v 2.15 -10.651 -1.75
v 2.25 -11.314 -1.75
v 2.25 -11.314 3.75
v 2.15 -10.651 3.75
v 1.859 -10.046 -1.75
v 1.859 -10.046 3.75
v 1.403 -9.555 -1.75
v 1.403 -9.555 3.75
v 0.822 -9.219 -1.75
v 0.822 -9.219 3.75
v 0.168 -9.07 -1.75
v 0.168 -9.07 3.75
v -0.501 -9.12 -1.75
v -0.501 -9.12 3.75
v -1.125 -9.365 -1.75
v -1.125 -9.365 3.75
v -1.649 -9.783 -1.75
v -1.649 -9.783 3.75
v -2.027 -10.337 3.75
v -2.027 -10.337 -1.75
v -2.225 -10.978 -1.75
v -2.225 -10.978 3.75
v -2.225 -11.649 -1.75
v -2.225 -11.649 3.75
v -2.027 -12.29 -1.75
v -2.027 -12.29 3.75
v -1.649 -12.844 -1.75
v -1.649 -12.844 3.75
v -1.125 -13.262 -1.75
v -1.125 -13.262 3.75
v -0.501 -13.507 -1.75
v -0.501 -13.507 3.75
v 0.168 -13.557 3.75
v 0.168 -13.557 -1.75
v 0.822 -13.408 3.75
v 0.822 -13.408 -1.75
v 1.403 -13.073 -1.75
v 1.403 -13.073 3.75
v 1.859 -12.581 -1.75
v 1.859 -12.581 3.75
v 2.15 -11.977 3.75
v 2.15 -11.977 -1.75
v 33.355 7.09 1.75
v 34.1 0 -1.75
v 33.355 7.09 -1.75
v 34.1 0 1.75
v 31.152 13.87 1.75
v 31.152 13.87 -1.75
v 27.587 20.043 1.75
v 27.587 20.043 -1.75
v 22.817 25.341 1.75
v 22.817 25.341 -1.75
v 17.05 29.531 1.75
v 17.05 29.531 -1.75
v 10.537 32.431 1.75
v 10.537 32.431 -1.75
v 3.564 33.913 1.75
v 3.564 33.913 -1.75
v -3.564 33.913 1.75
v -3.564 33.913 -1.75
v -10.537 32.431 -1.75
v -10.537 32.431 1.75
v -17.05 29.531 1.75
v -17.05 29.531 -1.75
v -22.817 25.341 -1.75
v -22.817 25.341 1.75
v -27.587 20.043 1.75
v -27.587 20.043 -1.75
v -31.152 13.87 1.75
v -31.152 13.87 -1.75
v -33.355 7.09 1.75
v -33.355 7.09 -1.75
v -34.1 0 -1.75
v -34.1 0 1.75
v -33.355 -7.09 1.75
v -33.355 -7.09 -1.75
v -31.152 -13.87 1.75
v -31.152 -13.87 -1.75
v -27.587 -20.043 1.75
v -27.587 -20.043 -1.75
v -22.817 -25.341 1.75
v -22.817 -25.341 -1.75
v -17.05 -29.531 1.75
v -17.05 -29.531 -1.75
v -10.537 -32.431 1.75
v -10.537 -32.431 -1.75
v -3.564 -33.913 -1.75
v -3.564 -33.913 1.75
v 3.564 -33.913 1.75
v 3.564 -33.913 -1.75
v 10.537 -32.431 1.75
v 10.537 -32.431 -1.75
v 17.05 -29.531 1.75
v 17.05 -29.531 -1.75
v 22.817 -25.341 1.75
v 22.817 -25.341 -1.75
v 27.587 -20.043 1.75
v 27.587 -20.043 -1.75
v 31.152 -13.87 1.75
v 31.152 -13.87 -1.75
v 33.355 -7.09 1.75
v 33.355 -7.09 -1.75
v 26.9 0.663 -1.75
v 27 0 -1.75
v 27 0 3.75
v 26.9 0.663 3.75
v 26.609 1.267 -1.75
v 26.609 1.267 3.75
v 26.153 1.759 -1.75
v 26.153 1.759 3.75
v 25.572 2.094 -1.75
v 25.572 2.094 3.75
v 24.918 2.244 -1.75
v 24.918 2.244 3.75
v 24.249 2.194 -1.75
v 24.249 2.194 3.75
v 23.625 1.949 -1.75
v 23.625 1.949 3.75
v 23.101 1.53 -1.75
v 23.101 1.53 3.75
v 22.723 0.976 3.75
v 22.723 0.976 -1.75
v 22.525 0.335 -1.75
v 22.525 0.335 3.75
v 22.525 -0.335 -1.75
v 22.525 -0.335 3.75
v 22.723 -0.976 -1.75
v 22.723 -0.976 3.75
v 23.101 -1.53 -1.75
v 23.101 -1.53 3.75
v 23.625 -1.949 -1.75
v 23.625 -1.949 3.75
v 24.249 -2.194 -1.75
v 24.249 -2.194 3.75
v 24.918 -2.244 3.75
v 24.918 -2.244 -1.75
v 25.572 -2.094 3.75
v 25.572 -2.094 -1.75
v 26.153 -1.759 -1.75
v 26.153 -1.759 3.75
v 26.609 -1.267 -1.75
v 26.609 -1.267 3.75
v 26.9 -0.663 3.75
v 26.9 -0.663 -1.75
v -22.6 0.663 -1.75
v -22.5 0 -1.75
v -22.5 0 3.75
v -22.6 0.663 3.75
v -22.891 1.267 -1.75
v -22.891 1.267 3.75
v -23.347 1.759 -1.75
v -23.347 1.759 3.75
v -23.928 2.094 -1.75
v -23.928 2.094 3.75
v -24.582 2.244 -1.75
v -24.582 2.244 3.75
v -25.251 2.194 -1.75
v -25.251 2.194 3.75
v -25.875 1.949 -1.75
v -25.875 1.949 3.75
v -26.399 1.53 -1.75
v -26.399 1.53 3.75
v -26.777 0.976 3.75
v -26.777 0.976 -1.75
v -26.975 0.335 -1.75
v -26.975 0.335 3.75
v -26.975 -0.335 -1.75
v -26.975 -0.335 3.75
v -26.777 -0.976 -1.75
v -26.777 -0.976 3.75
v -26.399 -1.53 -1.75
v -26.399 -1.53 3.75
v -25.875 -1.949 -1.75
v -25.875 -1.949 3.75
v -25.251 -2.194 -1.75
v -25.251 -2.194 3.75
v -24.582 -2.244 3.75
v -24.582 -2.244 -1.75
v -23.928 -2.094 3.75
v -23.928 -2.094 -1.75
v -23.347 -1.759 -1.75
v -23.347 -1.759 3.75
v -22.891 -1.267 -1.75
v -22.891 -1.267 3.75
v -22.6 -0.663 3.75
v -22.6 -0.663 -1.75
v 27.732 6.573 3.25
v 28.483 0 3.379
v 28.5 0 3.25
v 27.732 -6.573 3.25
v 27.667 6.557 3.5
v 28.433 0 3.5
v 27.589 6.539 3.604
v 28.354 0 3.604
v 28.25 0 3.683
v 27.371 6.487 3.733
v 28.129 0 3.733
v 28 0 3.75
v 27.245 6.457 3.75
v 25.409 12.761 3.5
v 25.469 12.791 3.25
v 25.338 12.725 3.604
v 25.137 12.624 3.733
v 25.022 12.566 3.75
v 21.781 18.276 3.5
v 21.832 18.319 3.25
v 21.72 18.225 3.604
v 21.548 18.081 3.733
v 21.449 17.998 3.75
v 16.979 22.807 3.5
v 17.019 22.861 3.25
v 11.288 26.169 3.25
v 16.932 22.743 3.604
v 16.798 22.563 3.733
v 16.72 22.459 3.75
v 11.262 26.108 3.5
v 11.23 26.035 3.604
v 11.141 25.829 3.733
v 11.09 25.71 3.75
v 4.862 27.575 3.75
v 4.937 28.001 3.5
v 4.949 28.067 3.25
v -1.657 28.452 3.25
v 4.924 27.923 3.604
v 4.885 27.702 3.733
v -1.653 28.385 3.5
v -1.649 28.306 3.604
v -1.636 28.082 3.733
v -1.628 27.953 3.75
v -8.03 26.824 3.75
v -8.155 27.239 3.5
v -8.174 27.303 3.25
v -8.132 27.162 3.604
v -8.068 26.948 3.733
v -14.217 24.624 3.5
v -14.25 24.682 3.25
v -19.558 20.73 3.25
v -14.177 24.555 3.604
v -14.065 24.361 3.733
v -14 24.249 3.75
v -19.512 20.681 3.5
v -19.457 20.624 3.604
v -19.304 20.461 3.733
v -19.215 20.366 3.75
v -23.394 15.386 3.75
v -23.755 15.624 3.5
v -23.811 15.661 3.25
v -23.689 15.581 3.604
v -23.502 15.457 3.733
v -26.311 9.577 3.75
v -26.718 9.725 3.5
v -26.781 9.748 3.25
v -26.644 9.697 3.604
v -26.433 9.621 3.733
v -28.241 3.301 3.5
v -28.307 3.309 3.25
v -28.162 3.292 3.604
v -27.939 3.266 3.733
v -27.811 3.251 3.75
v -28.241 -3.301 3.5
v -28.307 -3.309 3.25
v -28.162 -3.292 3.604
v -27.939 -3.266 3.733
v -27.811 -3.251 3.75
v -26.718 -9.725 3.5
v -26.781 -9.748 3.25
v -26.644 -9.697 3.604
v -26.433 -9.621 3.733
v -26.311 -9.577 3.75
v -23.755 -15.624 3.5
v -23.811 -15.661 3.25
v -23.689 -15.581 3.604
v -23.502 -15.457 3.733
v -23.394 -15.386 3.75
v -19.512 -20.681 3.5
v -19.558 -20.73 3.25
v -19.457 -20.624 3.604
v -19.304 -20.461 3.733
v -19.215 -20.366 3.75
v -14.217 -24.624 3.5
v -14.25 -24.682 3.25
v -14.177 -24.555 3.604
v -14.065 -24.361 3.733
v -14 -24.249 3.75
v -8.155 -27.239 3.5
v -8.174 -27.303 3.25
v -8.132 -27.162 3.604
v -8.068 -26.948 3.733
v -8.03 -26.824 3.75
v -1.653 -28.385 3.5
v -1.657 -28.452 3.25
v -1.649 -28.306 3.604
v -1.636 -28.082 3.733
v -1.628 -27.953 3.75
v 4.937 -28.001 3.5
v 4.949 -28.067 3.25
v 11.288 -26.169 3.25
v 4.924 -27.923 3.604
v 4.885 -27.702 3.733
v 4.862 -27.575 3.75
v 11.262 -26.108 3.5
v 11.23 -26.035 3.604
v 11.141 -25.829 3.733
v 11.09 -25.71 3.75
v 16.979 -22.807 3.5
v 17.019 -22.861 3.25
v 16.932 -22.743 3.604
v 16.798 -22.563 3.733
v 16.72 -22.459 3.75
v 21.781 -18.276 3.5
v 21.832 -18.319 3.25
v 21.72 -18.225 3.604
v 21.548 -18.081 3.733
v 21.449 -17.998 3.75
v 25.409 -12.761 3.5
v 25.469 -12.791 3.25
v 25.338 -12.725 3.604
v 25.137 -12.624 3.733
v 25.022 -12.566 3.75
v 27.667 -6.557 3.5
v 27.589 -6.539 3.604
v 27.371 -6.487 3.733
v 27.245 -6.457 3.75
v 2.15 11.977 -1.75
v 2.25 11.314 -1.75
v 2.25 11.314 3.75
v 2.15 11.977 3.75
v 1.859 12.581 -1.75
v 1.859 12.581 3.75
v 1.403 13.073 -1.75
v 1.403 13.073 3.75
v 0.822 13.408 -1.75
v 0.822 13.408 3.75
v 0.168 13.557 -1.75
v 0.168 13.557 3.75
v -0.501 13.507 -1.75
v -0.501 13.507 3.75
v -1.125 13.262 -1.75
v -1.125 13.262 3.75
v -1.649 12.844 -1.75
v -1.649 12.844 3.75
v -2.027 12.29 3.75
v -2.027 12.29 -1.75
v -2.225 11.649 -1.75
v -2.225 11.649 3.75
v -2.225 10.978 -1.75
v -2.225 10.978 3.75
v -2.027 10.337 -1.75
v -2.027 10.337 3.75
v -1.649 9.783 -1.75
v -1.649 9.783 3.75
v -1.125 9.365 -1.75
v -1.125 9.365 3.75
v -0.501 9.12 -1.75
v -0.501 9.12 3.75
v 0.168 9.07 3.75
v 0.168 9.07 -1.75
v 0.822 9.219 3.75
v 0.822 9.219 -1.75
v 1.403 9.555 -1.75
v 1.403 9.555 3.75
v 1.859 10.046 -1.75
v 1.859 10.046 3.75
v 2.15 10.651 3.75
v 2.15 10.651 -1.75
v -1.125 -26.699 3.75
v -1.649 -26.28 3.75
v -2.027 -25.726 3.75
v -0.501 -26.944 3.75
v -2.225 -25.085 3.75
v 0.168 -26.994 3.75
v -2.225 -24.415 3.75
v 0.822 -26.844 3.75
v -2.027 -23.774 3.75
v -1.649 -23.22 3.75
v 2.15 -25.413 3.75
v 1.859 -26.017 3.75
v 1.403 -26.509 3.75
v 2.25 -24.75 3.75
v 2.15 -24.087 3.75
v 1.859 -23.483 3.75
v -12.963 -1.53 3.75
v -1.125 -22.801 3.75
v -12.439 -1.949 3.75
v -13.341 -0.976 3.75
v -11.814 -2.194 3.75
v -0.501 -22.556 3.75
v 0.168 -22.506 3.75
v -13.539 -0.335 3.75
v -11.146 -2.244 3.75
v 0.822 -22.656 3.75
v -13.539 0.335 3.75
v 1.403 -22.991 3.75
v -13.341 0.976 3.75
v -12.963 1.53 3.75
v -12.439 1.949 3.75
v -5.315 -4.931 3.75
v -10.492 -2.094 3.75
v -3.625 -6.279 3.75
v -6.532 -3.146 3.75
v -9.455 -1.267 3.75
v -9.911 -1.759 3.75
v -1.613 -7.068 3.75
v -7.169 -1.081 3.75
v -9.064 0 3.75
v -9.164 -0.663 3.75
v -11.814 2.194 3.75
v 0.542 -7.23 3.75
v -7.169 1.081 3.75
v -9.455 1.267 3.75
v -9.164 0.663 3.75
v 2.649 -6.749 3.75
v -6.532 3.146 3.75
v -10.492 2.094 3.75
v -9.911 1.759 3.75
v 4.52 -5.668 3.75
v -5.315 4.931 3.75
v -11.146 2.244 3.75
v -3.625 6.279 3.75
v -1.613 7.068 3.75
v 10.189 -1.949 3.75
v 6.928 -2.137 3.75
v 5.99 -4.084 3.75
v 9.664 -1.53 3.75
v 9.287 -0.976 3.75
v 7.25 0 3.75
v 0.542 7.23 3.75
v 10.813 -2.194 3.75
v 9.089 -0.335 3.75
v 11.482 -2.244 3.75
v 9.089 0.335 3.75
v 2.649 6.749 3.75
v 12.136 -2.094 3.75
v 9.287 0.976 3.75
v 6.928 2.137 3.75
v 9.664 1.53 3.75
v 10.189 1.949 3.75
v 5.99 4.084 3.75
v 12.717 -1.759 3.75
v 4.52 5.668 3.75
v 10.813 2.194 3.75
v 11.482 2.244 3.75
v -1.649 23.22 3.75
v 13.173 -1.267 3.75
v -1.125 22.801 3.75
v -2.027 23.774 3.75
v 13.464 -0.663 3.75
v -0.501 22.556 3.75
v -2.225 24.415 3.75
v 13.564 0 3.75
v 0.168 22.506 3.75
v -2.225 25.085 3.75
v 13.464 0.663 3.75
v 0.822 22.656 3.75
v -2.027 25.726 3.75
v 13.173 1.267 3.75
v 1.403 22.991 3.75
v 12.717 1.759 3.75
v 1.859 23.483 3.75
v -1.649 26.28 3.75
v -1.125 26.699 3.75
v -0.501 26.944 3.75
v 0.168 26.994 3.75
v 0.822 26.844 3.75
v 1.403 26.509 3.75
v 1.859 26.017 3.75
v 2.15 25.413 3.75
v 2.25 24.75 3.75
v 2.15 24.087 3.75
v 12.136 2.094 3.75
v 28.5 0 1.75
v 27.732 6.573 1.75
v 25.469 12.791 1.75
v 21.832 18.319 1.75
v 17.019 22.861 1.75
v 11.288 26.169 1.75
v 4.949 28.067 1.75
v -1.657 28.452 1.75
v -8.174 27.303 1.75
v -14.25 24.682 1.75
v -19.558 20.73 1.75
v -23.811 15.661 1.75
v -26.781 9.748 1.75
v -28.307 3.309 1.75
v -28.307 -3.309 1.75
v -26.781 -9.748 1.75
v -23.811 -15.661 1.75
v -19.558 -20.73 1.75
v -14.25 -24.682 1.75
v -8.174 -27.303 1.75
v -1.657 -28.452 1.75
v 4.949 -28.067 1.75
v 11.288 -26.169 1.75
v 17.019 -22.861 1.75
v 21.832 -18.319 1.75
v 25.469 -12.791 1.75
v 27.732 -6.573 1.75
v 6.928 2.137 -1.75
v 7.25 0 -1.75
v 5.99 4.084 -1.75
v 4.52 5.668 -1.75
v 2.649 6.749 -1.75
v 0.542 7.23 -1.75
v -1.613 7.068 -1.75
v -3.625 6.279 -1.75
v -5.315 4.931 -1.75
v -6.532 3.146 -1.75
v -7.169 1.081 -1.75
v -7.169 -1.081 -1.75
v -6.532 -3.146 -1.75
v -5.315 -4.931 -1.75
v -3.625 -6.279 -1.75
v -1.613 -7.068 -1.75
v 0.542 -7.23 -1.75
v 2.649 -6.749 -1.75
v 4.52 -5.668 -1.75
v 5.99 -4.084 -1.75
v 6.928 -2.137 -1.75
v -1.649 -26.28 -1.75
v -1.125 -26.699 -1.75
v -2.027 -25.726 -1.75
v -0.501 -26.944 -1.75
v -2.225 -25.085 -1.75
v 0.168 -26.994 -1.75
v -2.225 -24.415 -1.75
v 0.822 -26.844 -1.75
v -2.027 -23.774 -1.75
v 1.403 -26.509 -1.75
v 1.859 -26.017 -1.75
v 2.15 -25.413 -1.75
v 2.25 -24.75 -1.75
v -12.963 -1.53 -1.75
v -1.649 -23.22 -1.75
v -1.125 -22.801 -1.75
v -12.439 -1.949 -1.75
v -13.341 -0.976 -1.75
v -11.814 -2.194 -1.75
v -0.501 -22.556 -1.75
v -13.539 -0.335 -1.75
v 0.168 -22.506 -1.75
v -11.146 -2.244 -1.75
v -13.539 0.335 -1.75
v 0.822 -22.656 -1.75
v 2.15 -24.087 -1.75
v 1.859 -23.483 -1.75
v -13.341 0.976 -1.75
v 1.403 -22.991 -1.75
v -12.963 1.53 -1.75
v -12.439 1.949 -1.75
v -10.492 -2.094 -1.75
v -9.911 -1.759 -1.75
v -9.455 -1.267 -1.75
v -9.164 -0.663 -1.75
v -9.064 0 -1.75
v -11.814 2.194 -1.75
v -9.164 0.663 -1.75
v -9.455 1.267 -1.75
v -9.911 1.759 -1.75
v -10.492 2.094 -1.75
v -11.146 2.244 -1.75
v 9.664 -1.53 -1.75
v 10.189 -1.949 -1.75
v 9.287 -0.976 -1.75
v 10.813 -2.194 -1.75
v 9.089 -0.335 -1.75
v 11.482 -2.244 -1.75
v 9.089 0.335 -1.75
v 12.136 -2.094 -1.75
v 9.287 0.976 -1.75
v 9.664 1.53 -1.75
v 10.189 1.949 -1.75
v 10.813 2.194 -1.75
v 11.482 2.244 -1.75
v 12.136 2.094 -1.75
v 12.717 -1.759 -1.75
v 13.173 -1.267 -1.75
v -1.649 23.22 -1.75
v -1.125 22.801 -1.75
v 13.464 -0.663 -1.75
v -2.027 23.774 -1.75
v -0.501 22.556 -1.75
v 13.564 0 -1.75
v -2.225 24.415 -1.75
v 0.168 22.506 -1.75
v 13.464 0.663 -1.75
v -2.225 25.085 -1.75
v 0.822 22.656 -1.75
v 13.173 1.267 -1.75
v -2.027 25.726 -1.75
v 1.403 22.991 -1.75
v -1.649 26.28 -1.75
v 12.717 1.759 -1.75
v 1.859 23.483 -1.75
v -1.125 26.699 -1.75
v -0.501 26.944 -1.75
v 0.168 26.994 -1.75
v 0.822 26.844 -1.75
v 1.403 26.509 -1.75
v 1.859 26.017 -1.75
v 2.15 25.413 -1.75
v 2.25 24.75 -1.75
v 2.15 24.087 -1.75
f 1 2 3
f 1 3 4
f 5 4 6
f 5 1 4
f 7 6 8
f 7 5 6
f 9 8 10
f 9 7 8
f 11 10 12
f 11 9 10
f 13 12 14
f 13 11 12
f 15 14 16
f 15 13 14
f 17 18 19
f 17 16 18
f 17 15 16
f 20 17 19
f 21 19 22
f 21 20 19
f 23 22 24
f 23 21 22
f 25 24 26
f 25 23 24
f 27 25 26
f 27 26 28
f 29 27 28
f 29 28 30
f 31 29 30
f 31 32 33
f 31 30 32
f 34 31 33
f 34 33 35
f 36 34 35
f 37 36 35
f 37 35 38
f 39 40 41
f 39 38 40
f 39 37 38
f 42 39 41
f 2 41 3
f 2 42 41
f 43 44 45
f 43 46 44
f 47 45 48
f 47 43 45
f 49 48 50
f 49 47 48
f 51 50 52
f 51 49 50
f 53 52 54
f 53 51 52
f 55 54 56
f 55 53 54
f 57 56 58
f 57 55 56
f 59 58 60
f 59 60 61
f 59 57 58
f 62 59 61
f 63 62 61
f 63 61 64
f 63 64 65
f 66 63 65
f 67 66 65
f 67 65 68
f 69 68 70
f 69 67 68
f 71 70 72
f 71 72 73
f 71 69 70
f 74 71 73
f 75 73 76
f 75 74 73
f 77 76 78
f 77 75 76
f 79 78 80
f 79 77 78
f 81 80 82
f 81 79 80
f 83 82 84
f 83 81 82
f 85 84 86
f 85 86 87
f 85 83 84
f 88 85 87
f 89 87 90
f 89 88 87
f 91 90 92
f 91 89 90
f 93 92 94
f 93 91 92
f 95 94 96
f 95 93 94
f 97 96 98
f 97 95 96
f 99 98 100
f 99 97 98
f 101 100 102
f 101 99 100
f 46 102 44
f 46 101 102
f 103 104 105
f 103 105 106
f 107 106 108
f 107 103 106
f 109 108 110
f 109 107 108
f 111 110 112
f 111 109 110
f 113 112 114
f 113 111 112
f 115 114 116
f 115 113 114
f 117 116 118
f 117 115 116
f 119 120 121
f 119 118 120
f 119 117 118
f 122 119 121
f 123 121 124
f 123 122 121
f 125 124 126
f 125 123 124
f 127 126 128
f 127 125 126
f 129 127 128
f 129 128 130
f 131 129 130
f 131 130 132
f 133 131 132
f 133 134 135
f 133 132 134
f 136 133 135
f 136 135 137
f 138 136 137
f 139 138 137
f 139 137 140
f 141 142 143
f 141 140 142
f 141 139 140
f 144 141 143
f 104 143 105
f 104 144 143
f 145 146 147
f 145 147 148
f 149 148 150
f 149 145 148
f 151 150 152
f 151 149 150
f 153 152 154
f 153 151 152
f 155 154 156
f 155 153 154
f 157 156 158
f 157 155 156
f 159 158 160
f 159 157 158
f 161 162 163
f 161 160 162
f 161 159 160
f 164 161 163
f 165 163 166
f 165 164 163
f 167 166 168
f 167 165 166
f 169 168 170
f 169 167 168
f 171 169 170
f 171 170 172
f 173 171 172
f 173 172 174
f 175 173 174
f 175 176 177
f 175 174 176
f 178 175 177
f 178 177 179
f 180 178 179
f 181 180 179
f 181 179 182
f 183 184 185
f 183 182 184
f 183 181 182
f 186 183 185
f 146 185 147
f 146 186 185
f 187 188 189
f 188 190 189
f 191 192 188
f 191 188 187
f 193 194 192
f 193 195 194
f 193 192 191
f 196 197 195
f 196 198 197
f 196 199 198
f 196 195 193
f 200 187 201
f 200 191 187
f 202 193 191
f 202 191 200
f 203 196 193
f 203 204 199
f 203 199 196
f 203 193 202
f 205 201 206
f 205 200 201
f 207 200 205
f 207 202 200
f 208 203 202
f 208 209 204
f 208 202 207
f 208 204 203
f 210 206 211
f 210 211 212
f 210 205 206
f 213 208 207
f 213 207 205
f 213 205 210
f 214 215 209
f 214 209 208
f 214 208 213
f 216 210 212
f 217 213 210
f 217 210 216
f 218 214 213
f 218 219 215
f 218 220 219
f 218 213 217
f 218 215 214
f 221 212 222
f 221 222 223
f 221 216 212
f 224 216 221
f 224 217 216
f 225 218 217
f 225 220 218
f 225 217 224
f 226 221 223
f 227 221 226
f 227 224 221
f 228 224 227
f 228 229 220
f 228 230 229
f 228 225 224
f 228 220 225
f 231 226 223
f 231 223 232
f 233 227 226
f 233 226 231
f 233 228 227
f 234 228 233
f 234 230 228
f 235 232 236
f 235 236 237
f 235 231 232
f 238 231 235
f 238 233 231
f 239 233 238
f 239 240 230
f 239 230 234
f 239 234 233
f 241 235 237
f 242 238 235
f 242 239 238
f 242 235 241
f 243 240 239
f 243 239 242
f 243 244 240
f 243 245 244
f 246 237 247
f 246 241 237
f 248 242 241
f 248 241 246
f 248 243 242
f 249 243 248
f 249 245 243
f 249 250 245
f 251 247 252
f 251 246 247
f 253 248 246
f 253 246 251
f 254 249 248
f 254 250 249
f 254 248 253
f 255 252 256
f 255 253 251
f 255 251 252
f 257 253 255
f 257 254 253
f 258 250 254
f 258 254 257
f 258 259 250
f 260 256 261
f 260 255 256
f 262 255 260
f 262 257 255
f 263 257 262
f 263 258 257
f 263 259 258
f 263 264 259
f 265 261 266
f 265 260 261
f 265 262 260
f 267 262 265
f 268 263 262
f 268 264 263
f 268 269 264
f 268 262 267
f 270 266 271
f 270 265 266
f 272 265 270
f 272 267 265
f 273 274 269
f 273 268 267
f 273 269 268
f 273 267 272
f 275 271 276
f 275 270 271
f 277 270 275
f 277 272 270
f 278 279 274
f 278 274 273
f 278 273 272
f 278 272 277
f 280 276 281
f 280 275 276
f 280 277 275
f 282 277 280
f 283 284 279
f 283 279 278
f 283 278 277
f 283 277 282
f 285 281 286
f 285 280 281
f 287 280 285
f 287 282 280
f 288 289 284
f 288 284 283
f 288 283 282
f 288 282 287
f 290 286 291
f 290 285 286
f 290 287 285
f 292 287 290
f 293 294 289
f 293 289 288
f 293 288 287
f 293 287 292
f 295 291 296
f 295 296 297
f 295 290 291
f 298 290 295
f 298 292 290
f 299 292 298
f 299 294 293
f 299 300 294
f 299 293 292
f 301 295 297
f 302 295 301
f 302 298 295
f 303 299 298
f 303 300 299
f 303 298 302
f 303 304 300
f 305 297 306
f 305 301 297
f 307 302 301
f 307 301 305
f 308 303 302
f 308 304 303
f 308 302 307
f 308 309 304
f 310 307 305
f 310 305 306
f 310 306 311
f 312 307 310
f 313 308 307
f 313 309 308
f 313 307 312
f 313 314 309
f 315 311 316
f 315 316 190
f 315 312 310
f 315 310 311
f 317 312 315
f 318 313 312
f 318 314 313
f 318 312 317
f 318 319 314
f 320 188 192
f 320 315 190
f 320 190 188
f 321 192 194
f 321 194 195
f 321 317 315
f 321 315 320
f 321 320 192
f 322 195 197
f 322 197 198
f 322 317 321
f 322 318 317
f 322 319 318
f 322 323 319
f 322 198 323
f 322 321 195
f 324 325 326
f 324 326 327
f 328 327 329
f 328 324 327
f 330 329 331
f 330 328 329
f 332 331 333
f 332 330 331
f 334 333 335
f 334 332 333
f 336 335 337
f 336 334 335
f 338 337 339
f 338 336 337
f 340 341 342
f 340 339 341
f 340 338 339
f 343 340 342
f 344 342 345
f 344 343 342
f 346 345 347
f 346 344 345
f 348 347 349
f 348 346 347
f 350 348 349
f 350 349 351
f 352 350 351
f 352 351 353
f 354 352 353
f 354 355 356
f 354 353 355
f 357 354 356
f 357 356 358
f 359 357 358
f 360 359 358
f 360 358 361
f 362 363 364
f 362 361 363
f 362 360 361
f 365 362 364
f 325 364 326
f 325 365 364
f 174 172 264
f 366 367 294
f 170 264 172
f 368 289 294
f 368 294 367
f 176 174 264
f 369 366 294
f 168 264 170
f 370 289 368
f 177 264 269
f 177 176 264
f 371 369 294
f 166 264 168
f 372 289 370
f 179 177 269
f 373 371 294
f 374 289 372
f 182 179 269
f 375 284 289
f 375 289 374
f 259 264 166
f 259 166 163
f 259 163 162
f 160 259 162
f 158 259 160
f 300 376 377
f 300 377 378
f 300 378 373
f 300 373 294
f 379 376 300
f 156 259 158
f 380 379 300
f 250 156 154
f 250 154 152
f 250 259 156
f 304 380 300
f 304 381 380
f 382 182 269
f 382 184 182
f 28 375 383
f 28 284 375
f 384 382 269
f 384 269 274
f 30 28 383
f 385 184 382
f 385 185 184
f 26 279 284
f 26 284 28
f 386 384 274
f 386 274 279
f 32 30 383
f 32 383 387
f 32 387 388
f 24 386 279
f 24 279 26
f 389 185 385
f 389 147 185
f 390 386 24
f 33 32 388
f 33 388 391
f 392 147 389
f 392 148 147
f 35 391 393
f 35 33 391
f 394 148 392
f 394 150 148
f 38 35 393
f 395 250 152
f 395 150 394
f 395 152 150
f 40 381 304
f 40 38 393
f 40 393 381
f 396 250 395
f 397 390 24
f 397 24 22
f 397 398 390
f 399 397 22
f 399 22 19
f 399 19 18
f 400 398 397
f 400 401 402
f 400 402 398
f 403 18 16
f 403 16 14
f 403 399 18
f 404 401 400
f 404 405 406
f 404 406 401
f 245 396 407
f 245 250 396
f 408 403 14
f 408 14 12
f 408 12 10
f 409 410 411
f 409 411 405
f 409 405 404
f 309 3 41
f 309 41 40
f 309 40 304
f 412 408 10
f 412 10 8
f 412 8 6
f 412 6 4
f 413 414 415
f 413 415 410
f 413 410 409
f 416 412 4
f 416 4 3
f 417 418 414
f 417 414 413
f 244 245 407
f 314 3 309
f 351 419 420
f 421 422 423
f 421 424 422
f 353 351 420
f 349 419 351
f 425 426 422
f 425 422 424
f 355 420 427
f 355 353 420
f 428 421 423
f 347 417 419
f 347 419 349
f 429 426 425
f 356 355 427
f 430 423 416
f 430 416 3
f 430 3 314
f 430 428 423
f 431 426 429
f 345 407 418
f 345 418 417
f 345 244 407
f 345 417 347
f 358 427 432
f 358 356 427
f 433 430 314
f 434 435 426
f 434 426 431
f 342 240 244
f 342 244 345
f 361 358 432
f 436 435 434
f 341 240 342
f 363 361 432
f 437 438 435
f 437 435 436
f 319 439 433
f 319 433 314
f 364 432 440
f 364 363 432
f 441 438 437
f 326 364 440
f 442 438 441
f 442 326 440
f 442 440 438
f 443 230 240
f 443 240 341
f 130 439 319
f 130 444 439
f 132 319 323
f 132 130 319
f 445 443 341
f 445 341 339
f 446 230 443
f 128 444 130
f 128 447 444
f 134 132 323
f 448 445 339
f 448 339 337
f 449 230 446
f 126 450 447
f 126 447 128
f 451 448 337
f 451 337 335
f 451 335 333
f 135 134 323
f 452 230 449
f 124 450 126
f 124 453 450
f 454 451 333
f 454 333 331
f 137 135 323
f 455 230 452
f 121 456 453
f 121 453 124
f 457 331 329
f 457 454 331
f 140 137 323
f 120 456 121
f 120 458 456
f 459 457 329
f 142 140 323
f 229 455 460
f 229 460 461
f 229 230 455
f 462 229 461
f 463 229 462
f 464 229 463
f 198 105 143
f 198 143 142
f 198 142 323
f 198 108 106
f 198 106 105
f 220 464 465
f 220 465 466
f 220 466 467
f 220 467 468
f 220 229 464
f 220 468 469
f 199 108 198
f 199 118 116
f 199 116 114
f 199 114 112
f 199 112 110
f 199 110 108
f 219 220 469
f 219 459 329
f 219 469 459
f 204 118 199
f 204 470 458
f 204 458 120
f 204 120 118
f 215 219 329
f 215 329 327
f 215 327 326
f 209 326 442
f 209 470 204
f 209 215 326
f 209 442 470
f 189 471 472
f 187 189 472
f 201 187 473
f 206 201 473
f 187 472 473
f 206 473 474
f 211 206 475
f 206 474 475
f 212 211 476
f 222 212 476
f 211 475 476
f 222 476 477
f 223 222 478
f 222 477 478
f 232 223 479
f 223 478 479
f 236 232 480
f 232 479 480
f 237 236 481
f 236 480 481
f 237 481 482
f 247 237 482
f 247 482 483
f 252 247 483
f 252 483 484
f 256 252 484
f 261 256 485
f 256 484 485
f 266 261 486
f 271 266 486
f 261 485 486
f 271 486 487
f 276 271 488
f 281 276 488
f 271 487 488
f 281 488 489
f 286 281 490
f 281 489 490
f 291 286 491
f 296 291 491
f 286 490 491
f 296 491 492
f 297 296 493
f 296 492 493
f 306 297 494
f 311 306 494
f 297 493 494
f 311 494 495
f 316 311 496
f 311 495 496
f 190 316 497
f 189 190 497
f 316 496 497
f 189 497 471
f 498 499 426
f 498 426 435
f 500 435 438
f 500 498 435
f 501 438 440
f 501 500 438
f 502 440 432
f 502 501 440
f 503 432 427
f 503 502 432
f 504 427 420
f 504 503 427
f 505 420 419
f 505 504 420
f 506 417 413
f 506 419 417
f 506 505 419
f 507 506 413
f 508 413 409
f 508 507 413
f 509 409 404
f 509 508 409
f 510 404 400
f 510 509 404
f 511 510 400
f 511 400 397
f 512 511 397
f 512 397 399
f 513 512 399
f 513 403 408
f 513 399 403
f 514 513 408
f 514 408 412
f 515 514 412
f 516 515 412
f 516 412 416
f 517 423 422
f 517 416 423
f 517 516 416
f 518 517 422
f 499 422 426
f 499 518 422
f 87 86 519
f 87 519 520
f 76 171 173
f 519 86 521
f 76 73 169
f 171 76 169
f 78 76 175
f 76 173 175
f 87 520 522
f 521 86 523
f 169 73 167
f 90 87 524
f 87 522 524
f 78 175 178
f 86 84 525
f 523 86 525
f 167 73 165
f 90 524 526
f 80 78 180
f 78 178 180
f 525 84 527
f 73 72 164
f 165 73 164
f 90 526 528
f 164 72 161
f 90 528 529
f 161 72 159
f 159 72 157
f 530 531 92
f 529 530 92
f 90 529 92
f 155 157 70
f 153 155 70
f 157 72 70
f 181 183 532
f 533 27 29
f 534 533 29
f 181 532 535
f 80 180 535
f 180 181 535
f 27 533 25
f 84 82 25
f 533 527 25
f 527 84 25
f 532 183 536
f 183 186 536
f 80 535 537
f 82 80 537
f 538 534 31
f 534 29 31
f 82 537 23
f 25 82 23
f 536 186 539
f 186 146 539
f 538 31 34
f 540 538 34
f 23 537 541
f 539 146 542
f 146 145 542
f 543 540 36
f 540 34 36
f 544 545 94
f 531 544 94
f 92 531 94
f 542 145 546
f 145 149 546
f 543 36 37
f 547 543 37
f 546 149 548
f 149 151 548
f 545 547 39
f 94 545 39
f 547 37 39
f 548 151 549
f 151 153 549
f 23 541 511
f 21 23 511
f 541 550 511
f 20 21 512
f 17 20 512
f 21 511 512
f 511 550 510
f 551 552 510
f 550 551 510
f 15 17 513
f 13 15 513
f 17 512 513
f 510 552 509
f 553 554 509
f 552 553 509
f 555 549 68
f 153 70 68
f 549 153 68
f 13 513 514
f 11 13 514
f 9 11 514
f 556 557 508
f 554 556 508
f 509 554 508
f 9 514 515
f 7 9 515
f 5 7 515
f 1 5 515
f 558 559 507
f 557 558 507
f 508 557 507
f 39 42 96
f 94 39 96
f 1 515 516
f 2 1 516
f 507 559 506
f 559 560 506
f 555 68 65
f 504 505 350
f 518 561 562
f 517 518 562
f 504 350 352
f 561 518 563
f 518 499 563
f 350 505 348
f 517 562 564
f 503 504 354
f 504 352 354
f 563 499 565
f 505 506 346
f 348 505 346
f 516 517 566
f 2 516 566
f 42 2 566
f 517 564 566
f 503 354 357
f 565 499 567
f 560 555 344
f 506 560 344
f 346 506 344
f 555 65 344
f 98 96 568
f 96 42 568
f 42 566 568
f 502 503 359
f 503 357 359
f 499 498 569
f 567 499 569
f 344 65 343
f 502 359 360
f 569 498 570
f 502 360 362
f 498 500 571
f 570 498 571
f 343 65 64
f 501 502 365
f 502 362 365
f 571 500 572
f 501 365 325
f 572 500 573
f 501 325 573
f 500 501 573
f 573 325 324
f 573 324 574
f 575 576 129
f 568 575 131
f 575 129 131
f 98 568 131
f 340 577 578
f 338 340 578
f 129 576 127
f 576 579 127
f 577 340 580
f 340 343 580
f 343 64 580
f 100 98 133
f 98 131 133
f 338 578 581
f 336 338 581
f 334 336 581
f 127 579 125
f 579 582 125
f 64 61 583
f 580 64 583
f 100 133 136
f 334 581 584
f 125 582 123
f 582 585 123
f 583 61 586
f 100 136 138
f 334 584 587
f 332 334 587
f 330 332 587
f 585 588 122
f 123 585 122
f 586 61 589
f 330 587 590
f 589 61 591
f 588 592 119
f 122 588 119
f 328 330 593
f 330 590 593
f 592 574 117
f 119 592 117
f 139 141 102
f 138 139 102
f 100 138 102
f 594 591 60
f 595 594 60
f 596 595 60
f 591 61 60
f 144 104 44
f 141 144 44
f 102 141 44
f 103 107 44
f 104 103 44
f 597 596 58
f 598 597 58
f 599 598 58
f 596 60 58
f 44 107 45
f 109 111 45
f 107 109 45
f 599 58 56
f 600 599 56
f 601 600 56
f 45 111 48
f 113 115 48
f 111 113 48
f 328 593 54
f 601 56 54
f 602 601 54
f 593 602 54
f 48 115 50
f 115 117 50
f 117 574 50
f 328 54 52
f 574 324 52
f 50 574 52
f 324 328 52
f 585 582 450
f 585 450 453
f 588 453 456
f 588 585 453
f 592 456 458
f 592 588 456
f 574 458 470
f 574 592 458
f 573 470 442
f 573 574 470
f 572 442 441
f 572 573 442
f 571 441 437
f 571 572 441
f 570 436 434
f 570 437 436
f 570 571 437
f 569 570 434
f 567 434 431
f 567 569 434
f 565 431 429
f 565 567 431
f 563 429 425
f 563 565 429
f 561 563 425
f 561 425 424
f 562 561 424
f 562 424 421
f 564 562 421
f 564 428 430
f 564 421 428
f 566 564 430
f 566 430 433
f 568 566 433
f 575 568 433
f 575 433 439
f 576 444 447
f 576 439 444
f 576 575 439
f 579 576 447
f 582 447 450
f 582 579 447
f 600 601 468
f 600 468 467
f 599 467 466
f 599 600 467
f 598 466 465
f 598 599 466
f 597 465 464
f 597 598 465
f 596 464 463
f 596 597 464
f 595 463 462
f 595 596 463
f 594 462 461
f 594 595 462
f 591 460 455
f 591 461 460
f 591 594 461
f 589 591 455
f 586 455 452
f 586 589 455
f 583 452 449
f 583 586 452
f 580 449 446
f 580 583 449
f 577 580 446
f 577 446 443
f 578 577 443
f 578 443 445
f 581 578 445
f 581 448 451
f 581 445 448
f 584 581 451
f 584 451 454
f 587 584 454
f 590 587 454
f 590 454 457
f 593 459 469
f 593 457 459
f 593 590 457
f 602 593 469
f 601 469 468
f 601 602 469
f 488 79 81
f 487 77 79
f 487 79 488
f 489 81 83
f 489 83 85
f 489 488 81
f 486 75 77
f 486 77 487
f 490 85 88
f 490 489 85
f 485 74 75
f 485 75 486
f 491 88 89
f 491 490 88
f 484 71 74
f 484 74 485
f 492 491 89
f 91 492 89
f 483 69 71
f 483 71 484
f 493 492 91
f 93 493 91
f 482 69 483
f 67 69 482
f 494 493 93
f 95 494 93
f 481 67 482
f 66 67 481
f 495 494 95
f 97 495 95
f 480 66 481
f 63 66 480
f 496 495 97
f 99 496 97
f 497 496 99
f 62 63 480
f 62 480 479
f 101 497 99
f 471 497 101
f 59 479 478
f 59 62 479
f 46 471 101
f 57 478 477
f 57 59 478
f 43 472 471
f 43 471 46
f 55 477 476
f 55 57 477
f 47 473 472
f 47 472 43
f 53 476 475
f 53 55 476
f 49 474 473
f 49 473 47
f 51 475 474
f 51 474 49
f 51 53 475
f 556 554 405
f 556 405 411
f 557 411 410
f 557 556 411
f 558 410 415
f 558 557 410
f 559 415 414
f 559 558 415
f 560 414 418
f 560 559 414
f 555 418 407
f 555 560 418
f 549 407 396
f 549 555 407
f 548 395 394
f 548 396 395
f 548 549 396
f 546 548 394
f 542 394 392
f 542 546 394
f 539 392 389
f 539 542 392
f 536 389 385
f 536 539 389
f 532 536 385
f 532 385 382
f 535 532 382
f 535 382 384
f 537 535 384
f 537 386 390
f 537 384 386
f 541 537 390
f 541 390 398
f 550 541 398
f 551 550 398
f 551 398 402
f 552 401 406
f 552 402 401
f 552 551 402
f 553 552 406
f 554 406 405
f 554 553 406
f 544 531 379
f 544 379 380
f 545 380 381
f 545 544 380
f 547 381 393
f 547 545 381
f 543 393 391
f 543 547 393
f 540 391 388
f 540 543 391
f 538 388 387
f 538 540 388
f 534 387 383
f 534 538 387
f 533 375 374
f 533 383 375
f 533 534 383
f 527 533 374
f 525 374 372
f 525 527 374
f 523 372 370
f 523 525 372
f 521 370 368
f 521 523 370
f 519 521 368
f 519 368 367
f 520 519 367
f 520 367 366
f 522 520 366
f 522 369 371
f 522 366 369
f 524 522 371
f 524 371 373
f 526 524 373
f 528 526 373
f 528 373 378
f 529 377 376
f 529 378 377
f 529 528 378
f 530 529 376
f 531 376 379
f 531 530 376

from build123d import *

# Parameters (mm, degrees)
SKETCH1_R               = 34.1
BOSS_EXTRUDE1_DEPTH     = 1.75
SKETCH4_R               = 28.5
BOSS_EXTRUDE2_DEPTH     = 2
CUT_EXTRUDE2_DEPTH      = 49.351525312
CUT_EXTRUDE2_DEPTH_BACK = 49.351525312
SKETCH3_R               = 2.25
CUT_EXTRUDE1_DEPTH      = 49.351525312
CUT_EXTRUDE1_DEPTH_BACK = 49.351525312
SKETCH2_R               = 7.25
FILLET1_R               = 0.5


with BuildPart() as part:
    # Sketch1 → Boss-Extrude1 (new, symmetric)
    with BuildSketch(Plane.XY):
        Circle(SKETCH1_R)
    extrude(amount=BOSS_EXTRUDE1_DEPTH, both=True)

    # Sketch4 → Boss-Extrude2 (add)
    with BuildSketch(Plane.XY.offset(1.75)):
        Circle(SKETCH4_R)
    extrude(amount=BOSS_EXTRUDE2_DEPTH)

    # Sketch3 → Cut-Extrude2 (cut, two sides: drawn at the far end of the back side and taken through both)
    with BuildSketch(Plane.XY.offset(1.75).offset(-CUT_EXTRUDE2_DEPTH_BACK)):
        with Locations((0, 24.75)):
            Circle(SKETCH3_R)
        with Locations((0, 11.3137085)):
            Circle(SKETCH3_R)
        with Locations((24.75, 0)):
            Circle(SKETCH3_R)
        with Locations((11.3137085, 0)):
            Circle(SKETCH3_R)
        with Locations((0, -24.75)):
            Circle(SKETCH3_R)
        with Locations((0, -11.3137085)):
            Circle(SKETCH3_R)
        with Locations((-24.75, 0)):
            Circle(SKETCH3_R)
        with Locations((-11.3137085, 0)):
            Circle(SKETCH3_R)
    extrude(amount=CUT_EXTRUDE2_DEPTH + CUT_EXTRUDE2_DEPTH_BACK, mode=Mode.SUBTRACT)

    # Sketch2 → Cut-Extrude1 (cut, two sides: drawn at the far end of the back side and taken through both)
    with BuildSketch(Plane.XY.offset(1.75).offset(-CUT_EXTRUDE1_DEPTH_BACK)):
        Circle(SKETCH2_R)
    extrude(amount=CUT_EXTRUDE1_DEPTH + CUT_EXTRUDE1_DEPTH_BACK, mode=Mode.SUBTRACT)

    # Fillet1
    fillet1_edges = [part.edges().sort_by_distance(p)[0] for p in [
        (-28.5, 0, 3.75),
    ]]
    fillet(fillet1_edges, radius=FILLET1_R)


solid = part.part
